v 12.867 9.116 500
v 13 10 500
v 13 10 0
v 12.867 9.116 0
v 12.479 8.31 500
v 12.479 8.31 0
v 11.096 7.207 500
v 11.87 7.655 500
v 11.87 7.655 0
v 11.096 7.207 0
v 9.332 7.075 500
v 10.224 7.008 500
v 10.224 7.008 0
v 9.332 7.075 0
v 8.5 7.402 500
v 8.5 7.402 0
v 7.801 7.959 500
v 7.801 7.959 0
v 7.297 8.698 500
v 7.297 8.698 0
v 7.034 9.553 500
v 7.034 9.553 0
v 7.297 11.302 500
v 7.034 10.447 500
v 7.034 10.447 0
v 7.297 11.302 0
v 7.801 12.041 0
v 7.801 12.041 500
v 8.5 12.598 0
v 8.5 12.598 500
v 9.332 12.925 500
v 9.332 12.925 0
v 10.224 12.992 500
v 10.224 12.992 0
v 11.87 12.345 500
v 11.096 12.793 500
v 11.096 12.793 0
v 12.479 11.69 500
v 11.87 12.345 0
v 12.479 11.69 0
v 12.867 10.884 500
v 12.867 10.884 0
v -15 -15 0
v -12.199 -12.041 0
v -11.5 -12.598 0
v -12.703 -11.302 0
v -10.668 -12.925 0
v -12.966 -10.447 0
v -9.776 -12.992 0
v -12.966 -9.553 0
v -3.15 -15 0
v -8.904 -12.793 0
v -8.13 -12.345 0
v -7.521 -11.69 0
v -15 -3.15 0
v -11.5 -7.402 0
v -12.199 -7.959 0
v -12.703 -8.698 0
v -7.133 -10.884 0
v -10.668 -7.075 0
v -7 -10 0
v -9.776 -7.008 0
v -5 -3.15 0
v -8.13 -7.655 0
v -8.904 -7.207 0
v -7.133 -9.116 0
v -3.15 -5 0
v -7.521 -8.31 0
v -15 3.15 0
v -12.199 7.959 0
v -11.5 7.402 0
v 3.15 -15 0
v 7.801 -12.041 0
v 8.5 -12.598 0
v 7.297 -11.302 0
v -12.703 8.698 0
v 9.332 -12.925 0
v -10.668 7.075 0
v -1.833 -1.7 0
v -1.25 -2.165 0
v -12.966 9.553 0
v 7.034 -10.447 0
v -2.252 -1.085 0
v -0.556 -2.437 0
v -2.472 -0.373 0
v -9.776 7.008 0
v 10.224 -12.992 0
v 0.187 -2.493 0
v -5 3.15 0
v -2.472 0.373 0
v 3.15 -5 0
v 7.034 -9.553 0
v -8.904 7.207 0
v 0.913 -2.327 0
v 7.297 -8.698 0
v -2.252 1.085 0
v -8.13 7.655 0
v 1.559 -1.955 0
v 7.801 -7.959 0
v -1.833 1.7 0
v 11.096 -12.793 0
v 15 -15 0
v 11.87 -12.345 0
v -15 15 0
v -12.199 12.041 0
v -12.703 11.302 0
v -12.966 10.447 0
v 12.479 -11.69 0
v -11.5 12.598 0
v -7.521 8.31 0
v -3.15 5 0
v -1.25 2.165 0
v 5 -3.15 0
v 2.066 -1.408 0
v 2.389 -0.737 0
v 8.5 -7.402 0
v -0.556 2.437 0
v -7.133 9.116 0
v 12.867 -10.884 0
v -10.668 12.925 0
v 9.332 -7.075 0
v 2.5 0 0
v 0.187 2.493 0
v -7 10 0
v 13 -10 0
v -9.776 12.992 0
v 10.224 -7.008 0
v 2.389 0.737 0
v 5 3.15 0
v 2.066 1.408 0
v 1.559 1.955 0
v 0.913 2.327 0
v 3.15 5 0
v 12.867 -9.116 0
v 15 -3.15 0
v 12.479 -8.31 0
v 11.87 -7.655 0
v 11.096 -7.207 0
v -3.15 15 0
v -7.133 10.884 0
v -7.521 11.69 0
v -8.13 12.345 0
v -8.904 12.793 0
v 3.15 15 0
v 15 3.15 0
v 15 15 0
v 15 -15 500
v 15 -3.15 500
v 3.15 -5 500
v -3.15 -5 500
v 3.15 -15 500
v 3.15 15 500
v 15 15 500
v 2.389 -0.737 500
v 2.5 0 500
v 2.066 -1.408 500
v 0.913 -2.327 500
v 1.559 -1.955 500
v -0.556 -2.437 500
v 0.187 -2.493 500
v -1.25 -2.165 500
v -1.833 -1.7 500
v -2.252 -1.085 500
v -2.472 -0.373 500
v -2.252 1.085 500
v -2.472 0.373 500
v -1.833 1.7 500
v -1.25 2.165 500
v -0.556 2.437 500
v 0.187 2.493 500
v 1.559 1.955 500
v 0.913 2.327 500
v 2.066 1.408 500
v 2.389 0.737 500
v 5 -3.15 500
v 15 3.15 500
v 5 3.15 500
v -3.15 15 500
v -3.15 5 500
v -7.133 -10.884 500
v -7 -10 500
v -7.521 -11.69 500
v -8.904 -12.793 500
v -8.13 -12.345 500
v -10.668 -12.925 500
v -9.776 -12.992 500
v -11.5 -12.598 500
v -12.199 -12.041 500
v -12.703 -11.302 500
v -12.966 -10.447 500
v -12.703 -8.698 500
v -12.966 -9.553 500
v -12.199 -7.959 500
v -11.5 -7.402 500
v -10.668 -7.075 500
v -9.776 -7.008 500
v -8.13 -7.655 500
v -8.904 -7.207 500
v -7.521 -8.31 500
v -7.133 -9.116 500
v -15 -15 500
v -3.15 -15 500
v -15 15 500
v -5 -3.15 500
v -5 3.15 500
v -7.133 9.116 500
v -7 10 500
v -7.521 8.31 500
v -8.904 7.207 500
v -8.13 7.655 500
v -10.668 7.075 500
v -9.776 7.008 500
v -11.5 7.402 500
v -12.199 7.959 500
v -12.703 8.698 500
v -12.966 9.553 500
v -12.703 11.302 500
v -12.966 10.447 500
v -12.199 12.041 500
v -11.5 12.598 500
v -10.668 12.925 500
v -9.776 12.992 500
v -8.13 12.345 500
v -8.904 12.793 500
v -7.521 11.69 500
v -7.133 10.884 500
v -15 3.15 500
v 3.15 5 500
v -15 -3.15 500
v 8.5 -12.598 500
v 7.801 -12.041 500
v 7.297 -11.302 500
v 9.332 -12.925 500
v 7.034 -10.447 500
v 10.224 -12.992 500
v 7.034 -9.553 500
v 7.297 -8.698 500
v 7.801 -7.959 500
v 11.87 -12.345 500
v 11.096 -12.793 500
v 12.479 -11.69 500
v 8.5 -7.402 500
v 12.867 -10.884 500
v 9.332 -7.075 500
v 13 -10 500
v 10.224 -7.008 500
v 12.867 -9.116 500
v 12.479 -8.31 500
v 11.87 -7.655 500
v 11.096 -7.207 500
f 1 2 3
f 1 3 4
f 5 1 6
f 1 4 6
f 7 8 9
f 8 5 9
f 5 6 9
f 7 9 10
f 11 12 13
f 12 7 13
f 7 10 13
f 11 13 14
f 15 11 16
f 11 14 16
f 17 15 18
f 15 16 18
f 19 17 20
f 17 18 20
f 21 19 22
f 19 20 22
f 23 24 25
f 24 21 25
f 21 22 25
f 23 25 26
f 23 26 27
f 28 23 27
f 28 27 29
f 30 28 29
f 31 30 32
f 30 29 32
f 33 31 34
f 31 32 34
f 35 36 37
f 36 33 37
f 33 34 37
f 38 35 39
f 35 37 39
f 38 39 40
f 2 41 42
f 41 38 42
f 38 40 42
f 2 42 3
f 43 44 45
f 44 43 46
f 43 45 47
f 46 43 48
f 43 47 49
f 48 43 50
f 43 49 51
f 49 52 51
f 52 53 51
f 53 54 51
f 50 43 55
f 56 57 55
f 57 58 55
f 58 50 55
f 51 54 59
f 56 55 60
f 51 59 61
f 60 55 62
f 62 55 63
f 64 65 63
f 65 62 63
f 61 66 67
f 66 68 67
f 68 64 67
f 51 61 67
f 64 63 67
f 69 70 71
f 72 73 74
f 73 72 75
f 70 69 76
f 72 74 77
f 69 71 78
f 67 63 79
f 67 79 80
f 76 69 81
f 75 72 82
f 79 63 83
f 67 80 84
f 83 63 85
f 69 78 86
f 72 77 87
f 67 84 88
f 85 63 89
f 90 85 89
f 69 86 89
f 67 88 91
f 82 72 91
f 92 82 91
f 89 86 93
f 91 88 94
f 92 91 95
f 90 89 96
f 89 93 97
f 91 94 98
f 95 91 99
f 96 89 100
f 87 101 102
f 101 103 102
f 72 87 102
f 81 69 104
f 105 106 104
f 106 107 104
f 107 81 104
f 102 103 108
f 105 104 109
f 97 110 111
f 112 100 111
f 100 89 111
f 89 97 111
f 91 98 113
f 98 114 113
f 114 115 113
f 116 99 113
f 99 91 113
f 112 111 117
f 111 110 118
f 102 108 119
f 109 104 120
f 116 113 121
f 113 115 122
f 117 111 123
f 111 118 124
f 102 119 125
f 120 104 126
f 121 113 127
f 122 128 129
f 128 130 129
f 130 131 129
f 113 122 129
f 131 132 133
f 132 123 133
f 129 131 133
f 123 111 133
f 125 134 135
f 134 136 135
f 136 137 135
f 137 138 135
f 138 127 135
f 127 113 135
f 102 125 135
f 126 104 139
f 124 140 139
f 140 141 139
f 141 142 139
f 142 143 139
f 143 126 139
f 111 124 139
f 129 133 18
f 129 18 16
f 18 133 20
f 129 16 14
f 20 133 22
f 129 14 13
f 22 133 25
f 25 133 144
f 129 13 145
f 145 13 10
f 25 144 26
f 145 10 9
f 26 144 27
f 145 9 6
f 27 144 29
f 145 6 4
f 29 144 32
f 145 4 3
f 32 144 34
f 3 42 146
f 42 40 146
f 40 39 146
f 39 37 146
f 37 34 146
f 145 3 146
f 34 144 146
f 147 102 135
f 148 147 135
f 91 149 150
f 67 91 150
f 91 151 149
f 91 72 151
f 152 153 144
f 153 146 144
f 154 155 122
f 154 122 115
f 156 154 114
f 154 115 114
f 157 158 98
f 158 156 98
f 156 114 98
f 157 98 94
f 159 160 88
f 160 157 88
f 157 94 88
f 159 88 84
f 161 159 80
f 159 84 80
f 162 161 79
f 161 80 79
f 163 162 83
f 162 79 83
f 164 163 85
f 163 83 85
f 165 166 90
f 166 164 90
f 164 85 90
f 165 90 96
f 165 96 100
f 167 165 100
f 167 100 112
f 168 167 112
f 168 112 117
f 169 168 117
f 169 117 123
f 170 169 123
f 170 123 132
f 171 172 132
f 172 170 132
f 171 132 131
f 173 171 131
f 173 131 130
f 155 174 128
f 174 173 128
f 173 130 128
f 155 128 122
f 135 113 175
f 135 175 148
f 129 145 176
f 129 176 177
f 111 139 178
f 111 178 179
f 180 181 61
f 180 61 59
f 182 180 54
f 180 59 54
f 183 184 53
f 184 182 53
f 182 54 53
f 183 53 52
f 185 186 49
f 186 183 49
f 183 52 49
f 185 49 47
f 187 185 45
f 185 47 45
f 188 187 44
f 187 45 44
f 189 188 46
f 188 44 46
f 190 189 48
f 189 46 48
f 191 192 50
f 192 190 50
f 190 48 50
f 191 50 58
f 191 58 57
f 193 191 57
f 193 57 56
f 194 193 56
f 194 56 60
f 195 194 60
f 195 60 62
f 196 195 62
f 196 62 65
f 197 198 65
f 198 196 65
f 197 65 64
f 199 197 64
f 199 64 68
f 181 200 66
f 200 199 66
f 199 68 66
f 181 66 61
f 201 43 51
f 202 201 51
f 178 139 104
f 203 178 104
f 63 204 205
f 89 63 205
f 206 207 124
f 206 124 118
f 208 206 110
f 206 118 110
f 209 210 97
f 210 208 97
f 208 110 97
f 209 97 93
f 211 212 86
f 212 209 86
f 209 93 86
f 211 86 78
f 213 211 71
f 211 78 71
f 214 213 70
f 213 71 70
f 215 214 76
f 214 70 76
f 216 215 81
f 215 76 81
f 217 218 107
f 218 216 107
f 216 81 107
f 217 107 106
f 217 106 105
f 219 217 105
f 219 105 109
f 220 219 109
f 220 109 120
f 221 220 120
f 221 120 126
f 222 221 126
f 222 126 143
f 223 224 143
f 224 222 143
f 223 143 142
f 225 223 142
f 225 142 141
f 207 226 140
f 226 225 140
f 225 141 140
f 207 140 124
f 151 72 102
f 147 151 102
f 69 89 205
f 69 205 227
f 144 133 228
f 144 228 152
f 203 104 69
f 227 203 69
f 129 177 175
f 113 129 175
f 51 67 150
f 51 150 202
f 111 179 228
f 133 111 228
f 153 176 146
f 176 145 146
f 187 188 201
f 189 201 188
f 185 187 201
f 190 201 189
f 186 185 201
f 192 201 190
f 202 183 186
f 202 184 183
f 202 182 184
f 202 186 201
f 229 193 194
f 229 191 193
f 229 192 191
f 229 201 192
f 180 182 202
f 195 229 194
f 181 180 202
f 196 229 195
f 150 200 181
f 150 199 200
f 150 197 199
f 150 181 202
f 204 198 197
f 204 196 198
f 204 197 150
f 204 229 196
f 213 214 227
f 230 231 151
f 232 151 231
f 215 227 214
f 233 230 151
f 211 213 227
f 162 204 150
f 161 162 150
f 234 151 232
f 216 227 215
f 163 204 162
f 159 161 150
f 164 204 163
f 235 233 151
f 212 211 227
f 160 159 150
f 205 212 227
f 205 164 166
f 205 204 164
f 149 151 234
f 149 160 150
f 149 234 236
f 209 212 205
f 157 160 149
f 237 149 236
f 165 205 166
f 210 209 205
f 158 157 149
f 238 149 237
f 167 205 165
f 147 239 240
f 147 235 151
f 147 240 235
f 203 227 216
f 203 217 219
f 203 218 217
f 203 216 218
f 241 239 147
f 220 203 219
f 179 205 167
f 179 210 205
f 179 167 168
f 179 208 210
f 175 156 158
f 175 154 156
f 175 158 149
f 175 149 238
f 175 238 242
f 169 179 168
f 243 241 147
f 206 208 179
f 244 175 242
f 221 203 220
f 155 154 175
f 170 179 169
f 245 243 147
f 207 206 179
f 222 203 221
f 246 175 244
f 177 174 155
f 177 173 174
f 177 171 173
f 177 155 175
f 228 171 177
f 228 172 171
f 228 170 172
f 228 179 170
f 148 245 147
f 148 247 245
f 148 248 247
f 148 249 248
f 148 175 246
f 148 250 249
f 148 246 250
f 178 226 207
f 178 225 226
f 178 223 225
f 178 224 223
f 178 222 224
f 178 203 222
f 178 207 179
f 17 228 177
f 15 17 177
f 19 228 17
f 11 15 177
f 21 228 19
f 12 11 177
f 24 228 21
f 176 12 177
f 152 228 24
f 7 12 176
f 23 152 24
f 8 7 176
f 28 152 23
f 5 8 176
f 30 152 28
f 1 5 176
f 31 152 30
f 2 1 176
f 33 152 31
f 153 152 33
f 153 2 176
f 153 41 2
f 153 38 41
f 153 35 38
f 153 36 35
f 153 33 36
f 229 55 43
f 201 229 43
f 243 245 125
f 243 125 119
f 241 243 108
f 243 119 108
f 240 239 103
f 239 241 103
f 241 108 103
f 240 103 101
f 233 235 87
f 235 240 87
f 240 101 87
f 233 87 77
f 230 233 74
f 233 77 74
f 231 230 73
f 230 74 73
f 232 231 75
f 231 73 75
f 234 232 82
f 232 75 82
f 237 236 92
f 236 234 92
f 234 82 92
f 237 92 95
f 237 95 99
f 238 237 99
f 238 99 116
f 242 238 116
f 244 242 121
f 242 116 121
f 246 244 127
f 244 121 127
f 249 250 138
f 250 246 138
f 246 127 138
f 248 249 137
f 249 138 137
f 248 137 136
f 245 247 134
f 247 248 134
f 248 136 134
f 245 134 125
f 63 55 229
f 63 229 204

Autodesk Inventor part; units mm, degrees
ref_plane "YZ Plane" through (0, 0, 0) normal (1, 0, 0) x (0, 1, 0)
ref_plane "XZ Plane" through (0, 0, 0) normal (0, 1, 0) x (-1, 0, 0)
ref_plane "XY Plane" through (0, 0, 0) normal (0, 0, 1) x (1, 0, 0)
sketch "스케치1" plane through (0, 0, 0) normal (0, 0, 1) x (1, 0, 0)
  line L0 (15, 15) -> (-15, 15)
  line L1 (-15, 15) -> (-15, -15)
  line L2 (-15, -15) -> (15, -15)
  line L3 (15, -15) -> (15, 15)
  circle A0 centre (0, 0) radius 2.5
  circle A1 centre (-10, 10) radius 3
  circle A2 centre (10, 10) radius 3
  circle A3 centre (10, -10) radius 3
  circle A4 centre (-10, -10) radius 3
  line L4 (3.15, 15) -> (-3.15, 15)
  line L5 (-3.15, 15) -> (-3.15, 5)
  line L6 (-3.15, 5) -> (3.15, 5)
  line L7 (3.15, 5) -> (3.15, 15)
  line L8 (-15, -3.15) -> (-5, -3.15)
  line L9 (-5, 3.15) -> (-15, 3.15)
  line L10 (-5, -3.15) -> (-5, 3.15)
  line L11 (-15, 3.15) -> (-15, -3.15)
  line L12 (3.15, -15) -> (3.15, -5)
  line L13 (-3.15, -5) -> (-3.15, -15)
  line L14 (3.15, -5) -> (-3.15, -5)
  line L15 (-3.15, -15) -> (3.15, -15)
  line L16 (15, 3.15) -> (5, 3.15)
  line L17 (5, -3.15) -> (15, -3.15)
  line L18 (5, 3.15) -> (5, -3.15)
  line L19 (15, -3.15) -> (15, 3.15)
  dimension "d0" = 30
  dimension "d1" = 15
  dimension "d2" = 30
  dimension "d3" = 15
  dimension "d4" = 20
  dimension "d5" = 10
  dimension "d6" = 20
  dimension "d7" = 10
  dimension "d8" = 20
  dimension "d9" = 20
  dimension "d10" = 10
  dimension "d11" = 10
  dimension "d12" = 6
  dimension "d13" = 6
  dimension "d14" = 6
  dimension "d15" = 6
  dimension "d16" = 5
  dimension "d17" = 0
  dimension "d18" = 6.3
  dimension "d19" = 3.15
  dimension "d20" = 10
  dimension "d23" = 360
extrude "돌출1" add sketch "스케치1" along normal blind 500 contours L3 L16 L18 L17 L2 L12 L14 L13 L1 L8 L10 L9 L0 L5 L6 L7
equation "\"TransitionRadius\" = BendRadius"
equation "\"BendRadius\" = 0.5"
properties part number "3030500"
